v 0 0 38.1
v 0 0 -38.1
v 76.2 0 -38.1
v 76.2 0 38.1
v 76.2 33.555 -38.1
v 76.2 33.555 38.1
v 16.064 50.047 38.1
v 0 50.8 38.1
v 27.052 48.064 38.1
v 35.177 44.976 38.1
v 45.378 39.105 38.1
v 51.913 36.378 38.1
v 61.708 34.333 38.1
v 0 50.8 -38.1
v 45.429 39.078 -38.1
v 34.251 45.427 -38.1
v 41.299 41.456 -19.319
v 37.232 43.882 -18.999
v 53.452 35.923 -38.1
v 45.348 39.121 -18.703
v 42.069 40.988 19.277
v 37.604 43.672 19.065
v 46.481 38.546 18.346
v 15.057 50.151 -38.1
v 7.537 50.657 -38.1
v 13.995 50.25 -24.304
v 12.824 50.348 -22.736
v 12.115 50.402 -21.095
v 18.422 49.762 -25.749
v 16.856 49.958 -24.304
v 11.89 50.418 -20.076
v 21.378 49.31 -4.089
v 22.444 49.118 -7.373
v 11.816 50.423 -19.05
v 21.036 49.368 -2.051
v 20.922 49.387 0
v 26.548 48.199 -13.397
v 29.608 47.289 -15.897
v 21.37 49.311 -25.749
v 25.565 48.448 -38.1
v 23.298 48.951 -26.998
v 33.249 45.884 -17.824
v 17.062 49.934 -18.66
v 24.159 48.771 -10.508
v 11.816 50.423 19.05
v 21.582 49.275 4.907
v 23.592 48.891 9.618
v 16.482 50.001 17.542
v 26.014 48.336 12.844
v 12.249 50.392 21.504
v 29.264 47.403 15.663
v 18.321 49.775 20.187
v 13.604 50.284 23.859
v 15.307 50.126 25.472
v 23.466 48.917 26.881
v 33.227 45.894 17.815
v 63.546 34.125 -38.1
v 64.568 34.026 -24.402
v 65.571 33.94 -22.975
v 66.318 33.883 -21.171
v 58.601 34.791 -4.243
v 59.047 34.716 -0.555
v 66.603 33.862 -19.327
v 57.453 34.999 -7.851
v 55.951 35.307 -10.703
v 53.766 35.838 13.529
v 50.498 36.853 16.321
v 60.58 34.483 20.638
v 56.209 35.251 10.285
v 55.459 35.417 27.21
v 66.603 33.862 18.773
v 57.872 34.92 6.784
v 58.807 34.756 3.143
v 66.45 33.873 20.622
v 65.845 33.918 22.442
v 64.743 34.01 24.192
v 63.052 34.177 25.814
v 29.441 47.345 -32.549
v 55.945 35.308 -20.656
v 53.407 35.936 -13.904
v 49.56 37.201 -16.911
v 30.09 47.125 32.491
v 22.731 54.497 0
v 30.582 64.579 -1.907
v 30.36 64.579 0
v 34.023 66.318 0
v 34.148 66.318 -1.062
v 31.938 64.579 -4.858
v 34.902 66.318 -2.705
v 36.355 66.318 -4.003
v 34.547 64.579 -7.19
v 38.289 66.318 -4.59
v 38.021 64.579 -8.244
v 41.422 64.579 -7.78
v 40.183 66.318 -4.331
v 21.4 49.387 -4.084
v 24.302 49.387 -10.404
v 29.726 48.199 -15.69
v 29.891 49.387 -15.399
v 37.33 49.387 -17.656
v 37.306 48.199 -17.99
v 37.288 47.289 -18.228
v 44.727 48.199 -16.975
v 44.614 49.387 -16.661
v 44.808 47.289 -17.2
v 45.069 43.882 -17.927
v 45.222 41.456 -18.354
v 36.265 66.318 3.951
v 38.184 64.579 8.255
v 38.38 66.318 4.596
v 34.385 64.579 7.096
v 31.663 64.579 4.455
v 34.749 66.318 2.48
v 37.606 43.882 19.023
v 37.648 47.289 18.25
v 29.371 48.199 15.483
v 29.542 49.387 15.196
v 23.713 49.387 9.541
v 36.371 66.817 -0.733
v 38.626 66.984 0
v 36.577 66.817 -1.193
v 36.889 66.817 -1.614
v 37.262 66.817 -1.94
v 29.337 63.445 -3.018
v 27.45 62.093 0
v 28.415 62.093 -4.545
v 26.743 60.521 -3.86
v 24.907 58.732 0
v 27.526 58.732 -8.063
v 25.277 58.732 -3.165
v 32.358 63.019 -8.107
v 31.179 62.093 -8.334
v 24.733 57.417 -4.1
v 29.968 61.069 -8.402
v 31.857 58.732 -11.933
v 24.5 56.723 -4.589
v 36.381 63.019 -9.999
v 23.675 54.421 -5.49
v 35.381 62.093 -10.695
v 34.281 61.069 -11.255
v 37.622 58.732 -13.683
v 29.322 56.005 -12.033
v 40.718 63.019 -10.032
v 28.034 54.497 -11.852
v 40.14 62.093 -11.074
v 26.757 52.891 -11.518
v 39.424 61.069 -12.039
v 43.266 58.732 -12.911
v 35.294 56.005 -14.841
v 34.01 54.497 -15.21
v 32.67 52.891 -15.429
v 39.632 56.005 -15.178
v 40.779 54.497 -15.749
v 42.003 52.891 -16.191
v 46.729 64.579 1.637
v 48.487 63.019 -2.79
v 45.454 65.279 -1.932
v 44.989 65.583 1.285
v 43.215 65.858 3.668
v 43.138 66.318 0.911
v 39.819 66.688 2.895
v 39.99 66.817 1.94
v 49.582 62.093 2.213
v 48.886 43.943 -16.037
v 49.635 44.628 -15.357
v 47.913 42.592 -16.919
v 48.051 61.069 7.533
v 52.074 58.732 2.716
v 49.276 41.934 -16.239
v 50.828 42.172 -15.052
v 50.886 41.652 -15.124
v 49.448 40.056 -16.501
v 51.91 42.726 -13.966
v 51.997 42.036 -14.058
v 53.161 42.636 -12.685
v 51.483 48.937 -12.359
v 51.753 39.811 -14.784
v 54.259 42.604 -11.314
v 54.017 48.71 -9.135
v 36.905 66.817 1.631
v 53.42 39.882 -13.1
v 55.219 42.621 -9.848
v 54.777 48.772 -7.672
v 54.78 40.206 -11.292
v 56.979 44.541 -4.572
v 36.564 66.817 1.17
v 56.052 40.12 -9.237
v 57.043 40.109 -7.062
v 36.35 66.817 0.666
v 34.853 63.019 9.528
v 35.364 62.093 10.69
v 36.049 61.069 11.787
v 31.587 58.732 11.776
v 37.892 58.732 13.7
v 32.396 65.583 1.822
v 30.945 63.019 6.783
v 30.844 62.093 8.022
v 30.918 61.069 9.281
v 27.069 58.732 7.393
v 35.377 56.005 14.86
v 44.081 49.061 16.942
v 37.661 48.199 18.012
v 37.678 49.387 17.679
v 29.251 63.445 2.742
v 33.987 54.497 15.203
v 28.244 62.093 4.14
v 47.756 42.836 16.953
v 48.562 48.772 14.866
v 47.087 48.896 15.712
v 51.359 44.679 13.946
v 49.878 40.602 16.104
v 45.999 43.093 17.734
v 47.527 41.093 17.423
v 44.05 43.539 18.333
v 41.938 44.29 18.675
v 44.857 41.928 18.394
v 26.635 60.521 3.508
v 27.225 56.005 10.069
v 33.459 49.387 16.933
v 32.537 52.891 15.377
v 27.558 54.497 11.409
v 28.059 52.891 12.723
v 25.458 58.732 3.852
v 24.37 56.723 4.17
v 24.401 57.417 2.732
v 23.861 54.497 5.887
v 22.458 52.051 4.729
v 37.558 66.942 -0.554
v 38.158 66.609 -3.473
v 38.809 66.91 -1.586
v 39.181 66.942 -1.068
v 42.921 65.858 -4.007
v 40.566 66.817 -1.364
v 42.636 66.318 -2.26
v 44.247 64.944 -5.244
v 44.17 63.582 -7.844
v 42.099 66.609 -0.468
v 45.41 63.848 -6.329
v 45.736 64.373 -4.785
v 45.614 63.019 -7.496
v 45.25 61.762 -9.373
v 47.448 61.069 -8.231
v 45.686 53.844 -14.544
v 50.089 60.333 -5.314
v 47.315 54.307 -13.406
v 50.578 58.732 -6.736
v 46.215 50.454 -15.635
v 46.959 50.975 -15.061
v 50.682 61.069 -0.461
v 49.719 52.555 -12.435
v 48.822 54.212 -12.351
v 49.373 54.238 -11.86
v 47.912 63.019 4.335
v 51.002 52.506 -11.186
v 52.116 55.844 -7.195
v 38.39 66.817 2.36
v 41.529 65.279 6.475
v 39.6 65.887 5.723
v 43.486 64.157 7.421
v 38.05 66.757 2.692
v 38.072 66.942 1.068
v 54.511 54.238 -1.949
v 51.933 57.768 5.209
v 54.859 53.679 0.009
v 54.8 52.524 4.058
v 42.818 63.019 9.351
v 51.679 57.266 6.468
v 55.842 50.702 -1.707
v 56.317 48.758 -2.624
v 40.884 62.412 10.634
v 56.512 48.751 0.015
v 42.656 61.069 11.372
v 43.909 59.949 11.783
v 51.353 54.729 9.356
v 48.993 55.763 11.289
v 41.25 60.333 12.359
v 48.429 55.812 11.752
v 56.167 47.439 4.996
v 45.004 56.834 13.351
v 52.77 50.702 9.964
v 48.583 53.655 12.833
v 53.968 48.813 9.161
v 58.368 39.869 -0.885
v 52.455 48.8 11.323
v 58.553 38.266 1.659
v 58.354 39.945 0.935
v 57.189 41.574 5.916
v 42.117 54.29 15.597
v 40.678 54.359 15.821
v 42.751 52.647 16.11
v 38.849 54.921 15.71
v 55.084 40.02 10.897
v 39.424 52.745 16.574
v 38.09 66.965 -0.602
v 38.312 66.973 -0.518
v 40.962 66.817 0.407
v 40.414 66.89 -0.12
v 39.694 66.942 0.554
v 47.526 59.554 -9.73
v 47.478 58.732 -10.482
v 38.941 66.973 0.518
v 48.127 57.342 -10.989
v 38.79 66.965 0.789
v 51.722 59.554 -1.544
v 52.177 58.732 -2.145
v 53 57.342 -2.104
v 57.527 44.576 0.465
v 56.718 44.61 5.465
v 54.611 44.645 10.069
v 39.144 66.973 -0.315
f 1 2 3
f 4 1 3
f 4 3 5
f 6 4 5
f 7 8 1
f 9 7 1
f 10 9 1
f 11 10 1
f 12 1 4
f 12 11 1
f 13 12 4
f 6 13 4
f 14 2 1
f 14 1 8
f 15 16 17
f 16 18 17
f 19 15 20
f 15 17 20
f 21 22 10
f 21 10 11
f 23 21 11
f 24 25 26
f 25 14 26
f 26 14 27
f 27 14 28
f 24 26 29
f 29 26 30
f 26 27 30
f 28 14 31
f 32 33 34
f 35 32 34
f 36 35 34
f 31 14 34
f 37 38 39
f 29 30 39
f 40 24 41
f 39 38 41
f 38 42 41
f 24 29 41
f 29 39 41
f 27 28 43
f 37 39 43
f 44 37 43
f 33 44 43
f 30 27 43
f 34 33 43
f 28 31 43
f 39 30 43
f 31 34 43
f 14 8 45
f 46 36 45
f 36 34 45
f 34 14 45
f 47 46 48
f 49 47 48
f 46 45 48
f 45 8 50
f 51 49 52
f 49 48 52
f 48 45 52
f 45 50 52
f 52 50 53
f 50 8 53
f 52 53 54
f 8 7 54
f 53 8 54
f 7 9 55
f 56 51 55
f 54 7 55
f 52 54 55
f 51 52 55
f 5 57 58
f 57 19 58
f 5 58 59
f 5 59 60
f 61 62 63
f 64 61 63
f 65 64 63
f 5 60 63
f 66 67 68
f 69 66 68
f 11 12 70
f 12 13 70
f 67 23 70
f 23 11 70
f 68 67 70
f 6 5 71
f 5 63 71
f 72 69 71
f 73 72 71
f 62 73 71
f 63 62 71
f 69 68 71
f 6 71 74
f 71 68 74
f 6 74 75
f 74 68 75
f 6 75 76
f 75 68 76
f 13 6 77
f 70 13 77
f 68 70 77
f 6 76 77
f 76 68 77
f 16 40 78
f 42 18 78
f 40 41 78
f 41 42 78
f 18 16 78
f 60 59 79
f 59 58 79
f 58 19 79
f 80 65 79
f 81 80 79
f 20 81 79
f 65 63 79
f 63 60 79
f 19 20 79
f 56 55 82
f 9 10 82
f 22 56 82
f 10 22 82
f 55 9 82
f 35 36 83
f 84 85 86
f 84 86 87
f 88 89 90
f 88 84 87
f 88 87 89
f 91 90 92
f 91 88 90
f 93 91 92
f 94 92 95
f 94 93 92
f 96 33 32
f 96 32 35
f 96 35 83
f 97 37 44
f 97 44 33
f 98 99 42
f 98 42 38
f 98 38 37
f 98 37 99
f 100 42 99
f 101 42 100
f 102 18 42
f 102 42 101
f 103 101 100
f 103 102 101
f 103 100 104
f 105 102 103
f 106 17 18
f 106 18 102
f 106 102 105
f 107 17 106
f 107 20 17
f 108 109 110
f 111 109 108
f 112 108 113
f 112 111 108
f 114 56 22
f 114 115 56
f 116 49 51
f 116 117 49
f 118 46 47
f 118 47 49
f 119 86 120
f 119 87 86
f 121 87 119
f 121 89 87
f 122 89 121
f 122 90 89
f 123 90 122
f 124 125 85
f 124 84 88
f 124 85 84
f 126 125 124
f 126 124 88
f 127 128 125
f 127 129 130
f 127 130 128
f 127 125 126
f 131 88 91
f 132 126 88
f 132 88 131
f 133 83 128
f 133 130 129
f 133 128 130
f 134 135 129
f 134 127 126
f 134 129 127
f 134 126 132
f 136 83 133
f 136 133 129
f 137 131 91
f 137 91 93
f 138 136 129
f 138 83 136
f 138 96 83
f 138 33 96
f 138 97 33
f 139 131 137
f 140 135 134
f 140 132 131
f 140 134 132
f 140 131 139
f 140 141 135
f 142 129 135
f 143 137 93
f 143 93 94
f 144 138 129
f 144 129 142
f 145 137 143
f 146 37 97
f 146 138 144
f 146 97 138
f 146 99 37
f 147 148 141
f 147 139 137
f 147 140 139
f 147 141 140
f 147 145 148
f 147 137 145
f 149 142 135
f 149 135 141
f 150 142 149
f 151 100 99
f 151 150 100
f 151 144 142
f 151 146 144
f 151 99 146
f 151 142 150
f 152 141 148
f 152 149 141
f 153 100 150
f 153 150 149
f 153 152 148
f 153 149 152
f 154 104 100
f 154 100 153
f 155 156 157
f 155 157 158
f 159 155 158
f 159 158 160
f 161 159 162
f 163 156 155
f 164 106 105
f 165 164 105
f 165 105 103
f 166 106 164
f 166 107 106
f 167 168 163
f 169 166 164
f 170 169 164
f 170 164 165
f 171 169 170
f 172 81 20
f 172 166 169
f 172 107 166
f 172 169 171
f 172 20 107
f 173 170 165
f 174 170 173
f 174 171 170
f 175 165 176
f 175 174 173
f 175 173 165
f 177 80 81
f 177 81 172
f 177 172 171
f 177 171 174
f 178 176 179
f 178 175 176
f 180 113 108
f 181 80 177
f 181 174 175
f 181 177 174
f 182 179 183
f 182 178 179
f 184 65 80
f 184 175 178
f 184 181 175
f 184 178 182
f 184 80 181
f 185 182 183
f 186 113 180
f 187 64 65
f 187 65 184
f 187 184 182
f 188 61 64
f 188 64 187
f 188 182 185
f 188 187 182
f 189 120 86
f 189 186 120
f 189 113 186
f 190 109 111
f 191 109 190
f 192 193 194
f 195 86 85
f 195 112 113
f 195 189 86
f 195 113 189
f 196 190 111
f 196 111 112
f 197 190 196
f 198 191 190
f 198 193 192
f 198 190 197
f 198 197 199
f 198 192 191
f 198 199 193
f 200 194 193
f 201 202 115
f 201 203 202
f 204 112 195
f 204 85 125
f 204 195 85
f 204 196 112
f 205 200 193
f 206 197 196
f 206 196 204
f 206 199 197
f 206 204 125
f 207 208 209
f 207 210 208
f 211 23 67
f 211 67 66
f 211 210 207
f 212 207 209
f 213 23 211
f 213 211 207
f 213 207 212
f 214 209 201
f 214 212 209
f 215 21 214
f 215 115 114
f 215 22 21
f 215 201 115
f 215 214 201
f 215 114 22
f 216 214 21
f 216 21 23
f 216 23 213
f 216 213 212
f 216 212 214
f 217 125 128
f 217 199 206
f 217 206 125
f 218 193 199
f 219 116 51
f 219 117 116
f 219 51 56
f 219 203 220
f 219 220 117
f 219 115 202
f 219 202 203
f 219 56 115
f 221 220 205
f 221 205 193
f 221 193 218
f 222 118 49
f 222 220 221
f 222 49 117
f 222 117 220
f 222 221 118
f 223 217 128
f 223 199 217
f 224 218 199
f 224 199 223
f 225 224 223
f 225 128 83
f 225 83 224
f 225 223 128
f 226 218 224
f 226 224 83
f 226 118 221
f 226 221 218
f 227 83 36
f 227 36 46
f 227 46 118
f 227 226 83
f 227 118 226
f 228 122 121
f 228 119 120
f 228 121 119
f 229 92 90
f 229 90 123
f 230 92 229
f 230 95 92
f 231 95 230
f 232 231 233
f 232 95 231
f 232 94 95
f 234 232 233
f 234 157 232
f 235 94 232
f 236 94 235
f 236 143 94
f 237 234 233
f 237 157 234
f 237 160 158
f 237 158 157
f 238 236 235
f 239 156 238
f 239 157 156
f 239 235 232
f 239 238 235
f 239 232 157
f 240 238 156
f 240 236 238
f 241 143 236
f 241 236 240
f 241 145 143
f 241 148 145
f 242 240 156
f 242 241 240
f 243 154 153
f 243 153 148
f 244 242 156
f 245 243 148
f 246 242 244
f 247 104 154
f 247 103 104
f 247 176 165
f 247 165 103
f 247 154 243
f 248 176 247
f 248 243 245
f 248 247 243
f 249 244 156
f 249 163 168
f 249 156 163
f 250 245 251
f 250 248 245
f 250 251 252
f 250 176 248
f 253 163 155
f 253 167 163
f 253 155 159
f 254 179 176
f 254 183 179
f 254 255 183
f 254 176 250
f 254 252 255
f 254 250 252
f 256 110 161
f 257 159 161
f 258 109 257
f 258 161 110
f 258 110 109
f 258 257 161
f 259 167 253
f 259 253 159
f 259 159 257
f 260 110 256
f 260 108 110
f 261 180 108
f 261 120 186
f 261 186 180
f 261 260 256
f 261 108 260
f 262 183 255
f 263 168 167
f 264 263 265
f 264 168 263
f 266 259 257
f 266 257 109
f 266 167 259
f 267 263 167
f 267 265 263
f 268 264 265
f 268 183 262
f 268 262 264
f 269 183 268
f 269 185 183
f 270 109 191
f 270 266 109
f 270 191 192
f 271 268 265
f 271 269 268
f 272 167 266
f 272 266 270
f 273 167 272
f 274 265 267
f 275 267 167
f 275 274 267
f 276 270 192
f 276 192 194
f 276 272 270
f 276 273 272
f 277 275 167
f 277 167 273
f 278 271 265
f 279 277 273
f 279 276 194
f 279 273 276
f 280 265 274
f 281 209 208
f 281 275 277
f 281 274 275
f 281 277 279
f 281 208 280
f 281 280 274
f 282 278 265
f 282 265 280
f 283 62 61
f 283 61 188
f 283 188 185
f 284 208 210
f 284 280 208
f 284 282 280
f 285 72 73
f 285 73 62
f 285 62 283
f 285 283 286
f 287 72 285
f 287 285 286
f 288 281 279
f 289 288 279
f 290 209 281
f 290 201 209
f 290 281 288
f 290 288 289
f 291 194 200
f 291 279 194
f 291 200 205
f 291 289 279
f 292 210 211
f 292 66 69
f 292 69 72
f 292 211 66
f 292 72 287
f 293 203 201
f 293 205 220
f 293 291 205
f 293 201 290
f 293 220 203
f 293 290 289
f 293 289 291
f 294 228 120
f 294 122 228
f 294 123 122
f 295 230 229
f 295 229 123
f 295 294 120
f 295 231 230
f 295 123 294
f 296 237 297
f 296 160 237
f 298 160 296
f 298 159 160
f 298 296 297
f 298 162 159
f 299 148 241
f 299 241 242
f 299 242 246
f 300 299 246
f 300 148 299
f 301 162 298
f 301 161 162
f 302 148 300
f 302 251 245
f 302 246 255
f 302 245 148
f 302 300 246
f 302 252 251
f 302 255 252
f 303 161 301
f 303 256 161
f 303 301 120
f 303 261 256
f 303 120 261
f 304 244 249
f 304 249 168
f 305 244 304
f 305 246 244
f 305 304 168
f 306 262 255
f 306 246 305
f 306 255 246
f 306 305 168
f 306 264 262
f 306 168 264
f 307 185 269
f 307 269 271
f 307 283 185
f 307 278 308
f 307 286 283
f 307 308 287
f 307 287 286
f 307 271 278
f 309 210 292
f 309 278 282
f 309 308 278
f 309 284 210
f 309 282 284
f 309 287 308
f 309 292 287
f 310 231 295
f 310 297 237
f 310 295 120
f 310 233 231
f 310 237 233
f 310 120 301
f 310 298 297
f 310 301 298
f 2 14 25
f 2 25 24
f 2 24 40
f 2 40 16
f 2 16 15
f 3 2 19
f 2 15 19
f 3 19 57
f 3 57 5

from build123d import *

# Parameters (mm, degrees)
BOSS_EXTRUDE1_DEPTH      = 38.1
BOSS_EXTRUDE1_DEPTH_BACK = 38.1
SKETCH1_W                = 76.2
SKETCH1_H                = 50.8
CUT_EXTRUDE1_DEPTH       = 120.1365603


with BuildPart() as part:
    # Sketch1 → Boss-Extrude1 (new, two sides: drawn at the far end of the back side and taken through both)
    with BuildSketch(Plane.XY.offset(-BOSS_EXTRUDE1_DEPTH_BACK)):
        with Locations((38.1, 25.4)):
            Rectangle(SKETCH1_W, SKETCH1_H)
    extrude(amount=BOSS_EXTRUDE1_DEPTH + BOSS_EXTRUDE1_DEPTH_BACK)

    # Sketch2 → Cut-Extrude1 (cut, through all)
    with BuildSketch(Plane.XY.offset(38.1)):
        with BuildLine():
            Line((0, 50.8), (76.2, 50.8))
            Line((76.2, 50.8), (76.2, 33.554716735))
            add(Edge.make_bspline(
                [(0, 50.8), (50.619099791, 50.8), (30.963551519, 33.554716735), (76.2, 33.554716735)],
                knots=[0, 0, 0, 0, 1, 1, 1, 1], degree=3))
        make_face()
    extrude(amount=-CUT_EXTRUDE1_DEPTH, mode=Mode.SUBTRACT)

    # Sketch3 → Revolve1 (revolve)
    with BuildSketch(Plane.XY):
        with BuildLine():
            Line((17.711739757, 28.999365941), (38.626183585, 28.999365941))
            Line((38.626183585, 28.999365941), (38.626183585, 66.983686716))
            add(Edge.make_bspline(
                [(38.626183585, 66.983686716), (20.189571229, 66.983686716), (17.711739757, 28.999365941)],
                knots=[0, 0, 0, 1, 1, 1], degree=2))
        make_face()
    revolve(axis=Axis((38.626183585, 75.672407866, 0), (0, -1, 0)))


solid = part.part
